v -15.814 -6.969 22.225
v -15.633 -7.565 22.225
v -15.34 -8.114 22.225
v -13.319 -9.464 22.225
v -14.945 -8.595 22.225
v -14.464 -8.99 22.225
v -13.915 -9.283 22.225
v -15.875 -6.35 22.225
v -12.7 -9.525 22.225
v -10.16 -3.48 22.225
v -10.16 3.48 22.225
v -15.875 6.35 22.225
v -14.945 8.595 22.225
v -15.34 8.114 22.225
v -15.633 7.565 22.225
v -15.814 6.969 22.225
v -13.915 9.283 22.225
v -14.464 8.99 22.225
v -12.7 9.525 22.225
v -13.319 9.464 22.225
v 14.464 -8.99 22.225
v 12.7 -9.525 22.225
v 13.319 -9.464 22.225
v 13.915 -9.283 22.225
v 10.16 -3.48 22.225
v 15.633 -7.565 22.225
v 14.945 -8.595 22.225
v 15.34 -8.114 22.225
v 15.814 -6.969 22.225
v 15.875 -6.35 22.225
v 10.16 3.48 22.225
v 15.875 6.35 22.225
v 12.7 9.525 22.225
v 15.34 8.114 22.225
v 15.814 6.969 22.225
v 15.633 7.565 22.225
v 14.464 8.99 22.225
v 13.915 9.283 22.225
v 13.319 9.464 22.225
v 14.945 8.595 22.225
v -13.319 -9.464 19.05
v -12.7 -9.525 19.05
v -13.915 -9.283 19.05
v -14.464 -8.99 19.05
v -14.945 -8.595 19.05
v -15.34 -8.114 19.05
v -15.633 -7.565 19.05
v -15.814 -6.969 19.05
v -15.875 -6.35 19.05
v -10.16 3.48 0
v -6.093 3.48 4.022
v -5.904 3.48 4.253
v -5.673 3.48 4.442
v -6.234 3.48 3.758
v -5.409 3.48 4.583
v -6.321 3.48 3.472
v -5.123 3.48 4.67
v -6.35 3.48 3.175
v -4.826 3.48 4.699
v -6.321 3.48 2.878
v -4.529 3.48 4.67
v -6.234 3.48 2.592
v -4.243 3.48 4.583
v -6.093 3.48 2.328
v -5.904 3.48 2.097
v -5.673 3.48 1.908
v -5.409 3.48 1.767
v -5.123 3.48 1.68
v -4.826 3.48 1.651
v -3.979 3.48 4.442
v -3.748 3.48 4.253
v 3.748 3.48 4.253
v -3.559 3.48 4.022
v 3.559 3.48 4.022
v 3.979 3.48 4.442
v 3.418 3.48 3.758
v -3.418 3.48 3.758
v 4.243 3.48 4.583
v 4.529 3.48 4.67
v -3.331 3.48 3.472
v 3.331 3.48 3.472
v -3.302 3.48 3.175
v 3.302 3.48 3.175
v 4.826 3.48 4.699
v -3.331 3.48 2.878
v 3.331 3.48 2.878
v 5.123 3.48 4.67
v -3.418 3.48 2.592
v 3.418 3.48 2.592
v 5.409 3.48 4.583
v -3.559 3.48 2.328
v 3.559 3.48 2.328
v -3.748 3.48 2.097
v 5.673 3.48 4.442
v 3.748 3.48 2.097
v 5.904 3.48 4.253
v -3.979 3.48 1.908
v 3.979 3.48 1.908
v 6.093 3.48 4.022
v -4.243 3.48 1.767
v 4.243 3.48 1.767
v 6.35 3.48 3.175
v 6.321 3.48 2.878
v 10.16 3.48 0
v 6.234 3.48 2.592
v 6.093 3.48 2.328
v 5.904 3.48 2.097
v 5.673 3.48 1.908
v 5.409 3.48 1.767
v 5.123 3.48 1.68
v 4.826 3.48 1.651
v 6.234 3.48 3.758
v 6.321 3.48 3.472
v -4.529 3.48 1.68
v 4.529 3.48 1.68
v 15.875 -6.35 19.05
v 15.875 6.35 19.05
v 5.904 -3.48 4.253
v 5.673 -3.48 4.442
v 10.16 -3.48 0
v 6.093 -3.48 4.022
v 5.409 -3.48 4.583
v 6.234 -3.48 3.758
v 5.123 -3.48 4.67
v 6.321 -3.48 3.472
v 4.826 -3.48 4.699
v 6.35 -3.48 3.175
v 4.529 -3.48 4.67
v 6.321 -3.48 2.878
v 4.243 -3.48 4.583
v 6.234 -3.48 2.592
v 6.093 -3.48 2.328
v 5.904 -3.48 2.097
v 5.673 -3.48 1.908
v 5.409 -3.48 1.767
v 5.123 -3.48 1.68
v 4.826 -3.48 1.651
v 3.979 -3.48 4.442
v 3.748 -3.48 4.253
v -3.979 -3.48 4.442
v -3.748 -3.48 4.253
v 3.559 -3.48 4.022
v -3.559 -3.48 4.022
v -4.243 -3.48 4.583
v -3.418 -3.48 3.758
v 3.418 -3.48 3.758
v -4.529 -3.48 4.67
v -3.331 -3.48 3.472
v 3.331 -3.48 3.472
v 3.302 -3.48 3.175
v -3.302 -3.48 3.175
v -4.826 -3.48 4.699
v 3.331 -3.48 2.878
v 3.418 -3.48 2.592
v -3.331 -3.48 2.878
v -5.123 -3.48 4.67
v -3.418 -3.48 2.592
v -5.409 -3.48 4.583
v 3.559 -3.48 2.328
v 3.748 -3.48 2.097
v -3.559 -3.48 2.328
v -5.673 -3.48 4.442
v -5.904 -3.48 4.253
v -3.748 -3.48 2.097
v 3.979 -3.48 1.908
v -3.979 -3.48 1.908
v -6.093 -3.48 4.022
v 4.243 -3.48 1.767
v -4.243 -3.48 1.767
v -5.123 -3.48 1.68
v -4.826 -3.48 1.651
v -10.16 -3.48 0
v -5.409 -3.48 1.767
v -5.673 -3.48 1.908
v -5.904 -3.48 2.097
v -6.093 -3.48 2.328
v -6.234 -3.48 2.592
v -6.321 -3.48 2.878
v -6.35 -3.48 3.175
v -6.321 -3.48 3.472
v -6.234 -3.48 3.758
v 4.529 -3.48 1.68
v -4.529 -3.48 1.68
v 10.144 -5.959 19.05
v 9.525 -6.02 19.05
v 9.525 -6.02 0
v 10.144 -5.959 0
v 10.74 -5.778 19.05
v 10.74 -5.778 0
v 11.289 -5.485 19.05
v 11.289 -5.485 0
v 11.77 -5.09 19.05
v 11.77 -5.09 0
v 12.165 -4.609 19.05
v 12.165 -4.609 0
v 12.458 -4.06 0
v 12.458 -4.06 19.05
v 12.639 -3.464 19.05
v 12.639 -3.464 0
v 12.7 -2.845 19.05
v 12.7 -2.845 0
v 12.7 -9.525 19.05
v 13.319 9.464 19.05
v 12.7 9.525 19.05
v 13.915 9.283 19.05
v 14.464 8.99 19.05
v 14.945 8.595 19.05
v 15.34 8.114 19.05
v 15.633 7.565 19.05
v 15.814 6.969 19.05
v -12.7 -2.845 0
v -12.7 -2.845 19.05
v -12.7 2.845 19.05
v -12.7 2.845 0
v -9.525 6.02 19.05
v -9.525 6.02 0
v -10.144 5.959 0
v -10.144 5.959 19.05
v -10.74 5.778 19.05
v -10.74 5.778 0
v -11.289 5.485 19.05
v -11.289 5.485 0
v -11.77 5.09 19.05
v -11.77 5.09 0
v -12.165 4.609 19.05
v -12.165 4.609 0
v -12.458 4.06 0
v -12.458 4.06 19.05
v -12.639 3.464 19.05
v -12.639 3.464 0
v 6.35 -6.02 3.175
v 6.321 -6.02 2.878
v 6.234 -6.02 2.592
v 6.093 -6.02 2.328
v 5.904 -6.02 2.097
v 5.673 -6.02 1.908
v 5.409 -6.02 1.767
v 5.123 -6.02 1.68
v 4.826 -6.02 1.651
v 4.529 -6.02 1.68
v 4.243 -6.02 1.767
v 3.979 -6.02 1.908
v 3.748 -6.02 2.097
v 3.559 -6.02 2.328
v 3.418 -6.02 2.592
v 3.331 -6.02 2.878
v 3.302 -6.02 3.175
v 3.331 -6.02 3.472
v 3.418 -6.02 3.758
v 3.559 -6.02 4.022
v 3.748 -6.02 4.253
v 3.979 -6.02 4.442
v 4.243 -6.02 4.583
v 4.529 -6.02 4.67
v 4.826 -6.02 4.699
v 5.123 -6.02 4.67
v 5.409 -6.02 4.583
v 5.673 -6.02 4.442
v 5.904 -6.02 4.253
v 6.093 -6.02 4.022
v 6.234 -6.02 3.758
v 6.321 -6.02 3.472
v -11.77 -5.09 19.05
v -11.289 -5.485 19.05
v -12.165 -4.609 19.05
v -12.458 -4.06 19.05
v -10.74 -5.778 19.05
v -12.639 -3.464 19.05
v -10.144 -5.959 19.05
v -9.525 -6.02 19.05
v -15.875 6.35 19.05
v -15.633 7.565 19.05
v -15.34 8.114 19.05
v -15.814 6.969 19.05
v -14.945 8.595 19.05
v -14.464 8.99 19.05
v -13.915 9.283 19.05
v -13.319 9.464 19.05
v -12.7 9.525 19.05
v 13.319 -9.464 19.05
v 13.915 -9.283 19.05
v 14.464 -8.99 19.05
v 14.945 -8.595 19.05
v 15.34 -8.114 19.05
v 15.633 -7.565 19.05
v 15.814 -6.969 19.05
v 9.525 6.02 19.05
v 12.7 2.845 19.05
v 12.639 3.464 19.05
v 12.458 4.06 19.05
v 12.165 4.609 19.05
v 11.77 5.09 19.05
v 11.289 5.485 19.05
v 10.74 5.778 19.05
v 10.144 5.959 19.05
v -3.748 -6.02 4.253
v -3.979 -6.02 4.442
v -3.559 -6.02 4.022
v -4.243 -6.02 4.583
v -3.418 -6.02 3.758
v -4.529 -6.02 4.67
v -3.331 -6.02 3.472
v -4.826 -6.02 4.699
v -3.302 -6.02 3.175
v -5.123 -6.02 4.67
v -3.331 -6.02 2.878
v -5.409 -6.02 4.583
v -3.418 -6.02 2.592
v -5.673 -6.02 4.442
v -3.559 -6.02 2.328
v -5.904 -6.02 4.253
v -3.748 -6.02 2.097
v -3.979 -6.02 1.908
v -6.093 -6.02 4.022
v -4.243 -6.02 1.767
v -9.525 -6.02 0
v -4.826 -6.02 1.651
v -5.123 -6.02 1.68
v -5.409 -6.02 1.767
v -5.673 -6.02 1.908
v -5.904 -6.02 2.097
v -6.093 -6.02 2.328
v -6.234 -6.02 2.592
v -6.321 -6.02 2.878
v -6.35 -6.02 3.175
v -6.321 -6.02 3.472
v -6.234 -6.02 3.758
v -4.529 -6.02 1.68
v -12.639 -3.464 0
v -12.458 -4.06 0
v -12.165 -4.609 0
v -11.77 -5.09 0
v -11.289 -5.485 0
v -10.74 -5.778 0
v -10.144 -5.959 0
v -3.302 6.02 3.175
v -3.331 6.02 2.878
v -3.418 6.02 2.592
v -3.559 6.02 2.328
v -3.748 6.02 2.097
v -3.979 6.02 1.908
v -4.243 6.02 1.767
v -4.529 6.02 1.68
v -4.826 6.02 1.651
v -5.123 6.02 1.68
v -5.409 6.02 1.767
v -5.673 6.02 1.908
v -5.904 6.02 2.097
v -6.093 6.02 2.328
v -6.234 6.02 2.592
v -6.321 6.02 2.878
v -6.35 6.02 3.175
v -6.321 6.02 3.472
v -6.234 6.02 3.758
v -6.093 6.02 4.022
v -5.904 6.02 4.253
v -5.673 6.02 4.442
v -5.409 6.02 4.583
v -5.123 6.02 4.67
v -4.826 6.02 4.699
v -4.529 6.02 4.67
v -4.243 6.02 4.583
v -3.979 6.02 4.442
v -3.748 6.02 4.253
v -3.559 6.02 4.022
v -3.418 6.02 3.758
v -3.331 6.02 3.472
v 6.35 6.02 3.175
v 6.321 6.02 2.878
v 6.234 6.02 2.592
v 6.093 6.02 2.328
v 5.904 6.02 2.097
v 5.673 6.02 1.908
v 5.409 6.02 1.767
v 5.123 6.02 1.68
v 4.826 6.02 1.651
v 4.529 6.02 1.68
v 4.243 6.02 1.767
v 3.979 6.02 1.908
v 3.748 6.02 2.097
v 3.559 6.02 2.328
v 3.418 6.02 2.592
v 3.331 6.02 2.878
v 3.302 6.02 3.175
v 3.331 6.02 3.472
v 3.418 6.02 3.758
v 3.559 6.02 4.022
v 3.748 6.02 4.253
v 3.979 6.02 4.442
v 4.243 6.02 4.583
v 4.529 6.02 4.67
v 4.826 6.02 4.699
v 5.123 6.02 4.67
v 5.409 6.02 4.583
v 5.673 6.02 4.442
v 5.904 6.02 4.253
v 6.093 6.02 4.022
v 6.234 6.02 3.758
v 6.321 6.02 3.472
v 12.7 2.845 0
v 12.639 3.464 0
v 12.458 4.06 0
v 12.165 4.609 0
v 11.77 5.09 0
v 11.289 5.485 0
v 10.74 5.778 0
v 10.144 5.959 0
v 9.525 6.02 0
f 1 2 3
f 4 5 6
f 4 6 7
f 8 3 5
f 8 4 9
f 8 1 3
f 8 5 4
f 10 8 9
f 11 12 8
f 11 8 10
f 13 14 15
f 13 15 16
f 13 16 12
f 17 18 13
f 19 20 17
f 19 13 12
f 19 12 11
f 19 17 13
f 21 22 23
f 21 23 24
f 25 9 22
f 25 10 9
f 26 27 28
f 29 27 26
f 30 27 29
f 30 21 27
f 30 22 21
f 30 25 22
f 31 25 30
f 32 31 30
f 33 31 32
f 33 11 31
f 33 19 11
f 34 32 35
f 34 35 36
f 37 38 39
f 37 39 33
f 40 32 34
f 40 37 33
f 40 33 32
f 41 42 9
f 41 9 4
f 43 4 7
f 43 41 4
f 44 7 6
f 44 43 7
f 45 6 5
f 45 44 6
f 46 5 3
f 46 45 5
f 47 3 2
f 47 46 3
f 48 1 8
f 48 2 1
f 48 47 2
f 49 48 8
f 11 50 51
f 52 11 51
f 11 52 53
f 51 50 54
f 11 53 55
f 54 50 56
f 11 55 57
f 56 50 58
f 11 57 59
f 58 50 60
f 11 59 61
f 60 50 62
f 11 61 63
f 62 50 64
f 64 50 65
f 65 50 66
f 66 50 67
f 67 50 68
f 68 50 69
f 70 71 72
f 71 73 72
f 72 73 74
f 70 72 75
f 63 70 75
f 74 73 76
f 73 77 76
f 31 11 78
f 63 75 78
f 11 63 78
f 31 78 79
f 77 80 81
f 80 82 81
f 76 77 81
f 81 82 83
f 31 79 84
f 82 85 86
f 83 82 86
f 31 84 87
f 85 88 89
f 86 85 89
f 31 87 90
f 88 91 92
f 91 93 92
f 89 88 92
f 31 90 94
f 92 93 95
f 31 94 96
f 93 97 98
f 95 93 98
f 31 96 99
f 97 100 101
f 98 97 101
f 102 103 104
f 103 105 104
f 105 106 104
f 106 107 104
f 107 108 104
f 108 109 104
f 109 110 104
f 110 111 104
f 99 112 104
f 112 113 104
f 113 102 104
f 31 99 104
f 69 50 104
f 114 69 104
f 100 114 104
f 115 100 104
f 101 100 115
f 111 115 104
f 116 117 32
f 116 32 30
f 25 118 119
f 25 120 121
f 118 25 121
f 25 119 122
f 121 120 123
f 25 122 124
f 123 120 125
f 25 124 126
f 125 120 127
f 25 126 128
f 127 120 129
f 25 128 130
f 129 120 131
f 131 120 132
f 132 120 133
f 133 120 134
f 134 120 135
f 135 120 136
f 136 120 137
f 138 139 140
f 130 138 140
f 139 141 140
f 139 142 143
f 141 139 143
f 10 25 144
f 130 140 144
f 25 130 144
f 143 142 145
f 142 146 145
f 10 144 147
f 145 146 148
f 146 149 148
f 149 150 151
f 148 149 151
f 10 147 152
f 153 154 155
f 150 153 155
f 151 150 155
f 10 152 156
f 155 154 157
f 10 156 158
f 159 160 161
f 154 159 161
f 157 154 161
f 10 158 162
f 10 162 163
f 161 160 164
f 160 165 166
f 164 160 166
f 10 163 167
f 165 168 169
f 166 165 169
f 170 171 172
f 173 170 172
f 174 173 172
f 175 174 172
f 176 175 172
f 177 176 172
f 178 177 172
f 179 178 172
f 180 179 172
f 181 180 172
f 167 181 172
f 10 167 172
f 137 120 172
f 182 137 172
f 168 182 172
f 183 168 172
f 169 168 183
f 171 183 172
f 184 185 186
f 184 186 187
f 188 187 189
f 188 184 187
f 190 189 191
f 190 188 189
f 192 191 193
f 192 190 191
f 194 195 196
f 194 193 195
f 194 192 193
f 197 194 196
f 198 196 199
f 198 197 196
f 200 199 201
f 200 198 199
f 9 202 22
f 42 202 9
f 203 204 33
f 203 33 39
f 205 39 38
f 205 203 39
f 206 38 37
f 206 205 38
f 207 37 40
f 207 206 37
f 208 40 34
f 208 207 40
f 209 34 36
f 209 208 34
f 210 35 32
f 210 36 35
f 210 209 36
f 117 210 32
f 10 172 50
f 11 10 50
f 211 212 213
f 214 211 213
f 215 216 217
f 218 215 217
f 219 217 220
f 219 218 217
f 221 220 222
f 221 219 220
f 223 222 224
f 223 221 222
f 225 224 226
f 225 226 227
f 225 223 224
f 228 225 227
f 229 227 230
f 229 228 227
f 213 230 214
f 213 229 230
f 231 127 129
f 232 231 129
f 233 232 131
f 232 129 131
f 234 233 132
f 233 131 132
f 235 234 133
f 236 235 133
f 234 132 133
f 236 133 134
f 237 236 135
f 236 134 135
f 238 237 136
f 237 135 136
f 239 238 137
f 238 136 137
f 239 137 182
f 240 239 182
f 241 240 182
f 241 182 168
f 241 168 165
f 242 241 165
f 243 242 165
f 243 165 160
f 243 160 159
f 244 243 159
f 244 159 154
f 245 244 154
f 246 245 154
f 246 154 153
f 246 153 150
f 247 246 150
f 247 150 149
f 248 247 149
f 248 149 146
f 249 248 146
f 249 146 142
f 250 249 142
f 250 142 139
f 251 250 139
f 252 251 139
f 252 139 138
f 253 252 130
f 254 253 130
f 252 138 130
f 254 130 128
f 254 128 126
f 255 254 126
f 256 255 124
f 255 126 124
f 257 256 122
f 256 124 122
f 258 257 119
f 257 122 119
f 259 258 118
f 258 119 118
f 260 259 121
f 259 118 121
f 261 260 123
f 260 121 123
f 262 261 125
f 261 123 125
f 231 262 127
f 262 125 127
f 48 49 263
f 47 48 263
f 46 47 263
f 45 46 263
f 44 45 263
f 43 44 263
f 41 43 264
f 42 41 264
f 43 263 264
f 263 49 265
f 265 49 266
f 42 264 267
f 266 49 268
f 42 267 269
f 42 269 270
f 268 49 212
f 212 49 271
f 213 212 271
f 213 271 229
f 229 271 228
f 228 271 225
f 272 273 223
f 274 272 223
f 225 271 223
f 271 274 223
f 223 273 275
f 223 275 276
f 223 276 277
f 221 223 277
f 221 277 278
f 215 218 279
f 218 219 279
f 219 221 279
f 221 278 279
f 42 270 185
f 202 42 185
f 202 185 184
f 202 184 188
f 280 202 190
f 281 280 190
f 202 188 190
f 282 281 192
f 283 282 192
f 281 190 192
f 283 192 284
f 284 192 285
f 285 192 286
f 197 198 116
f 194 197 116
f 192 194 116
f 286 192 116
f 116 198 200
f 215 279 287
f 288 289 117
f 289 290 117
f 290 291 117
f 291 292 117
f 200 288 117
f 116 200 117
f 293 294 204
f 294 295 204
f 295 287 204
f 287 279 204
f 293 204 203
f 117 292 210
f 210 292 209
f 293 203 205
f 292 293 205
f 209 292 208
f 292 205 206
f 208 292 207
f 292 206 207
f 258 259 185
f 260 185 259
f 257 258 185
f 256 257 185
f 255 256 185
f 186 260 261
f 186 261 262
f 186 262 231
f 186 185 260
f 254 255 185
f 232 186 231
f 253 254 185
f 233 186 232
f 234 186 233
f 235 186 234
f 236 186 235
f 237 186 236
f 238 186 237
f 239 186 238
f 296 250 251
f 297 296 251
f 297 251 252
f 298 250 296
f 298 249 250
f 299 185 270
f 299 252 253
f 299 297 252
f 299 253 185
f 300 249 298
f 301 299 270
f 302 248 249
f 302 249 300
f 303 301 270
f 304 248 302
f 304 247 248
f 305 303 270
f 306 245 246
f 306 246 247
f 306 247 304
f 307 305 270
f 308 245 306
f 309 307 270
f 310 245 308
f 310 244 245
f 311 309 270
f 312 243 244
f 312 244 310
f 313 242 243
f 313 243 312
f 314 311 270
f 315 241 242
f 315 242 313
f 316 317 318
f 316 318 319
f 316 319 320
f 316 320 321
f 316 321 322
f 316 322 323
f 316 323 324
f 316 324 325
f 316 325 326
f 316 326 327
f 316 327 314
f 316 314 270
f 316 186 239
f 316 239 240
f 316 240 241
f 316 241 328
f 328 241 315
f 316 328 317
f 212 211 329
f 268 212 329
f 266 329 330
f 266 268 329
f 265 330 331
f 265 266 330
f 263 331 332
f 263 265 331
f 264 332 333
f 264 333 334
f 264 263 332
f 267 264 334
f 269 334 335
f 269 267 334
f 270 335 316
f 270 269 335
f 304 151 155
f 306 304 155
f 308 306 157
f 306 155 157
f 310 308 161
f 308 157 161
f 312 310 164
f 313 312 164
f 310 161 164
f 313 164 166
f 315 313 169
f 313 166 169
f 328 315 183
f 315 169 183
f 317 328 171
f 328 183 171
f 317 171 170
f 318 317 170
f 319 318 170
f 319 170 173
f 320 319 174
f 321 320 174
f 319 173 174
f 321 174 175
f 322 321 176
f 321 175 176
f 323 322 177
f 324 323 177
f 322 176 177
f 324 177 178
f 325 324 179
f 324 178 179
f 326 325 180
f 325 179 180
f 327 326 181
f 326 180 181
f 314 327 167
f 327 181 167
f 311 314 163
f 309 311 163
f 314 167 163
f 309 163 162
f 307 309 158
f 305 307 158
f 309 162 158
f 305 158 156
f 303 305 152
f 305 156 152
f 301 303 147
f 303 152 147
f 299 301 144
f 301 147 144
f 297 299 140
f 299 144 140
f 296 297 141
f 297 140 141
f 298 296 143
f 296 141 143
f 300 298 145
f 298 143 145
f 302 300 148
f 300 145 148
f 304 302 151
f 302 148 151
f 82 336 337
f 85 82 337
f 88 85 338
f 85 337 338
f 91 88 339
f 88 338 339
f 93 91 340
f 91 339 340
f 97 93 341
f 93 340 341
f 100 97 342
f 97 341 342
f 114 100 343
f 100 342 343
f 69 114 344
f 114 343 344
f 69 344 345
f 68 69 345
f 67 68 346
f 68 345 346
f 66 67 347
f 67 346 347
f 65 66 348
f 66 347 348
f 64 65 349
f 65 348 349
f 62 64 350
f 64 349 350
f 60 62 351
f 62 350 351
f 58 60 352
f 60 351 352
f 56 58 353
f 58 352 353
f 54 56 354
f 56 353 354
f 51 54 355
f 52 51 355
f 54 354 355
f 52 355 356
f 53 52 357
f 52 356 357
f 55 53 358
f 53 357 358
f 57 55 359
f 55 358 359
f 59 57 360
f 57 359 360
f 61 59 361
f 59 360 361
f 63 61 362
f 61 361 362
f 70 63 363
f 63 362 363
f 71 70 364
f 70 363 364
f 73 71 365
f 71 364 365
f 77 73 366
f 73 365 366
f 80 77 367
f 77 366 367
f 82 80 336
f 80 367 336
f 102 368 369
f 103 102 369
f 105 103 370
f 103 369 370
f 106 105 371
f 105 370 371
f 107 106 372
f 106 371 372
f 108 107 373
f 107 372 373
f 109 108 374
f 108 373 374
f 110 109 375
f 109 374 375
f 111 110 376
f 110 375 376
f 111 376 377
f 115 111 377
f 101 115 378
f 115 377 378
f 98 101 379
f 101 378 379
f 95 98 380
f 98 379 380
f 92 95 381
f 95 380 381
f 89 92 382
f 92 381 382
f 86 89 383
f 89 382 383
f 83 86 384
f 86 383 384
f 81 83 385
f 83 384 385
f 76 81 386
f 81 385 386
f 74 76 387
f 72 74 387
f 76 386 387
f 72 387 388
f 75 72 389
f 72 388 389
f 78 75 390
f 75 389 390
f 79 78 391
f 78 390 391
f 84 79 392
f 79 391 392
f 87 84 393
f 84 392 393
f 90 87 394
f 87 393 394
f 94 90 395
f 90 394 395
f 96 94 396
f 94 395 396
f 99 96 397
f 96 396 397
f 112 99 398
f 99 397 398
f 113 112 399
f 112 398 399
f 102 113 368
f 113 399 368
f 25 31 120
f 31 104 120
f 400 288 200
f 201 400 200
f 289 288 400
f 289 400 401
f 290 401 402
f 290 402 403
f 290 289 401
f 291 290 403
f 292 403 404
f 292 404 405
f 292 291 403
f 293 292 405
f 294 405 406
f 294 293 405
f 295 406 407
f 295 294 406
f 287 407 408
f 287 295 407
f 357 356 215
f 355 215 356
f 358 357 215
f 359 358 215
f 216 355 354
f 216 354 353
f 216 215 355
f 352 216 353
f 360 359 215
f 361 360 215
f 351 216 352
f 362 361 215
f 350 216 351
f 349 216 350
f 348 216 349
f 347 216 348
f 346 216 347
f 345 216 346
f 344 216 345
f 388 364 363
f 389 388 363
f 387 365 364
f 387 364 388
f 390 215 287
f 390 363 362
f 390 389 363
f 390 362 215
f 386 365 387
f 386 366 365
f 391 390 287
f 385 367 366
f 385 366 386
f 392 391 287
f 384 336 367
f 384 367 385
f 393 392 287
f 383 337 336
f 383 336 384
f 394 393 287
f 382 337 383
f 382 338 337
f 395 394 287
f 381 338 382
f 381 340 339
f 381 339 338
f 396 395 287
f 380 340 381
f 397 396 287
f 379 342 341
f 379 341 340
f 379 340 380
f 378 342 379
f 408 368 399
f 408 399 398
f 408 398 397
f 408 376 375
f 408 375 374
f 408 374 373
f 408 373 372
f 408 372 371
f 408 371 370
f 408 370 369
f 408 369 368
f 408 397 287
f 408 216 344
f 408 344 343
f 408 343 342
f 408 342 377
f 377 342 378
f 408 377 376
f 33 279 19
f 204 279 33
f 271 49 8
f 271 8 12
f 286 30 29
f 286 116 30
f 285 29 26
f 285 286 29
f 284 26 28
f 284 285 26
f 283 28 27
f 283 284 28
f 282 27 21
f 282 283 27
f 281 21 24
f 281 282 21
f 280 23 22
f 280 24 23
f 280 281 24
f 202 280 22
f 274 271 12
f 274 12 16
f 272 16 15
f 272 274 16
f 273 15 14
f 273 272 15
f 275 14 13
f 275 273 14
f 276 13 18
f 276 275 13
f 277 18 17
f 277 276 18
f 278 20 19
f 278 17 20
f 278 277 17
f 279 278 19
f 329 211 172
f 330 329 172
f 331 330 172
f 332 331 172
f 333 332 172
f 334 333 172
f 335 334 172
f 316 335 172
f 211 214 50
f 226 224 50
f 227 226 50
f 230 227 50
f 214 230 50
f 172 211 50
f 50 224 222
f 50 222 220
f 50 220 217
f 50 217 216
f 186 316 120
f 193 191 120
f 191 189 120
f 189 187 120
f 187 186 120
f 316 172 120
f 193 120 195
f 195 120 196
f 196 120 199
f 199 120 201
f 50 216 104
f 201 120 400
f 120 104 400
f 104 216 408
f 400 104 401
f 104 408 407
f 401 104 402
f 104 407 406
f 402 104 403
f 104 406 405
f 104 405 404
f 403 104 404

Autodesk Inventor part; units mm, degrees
ref_plane "YZ Plane" through (0, 0, 0) normal (1, 0, 0) x (0, 1, 0)
ref_plane "XZ Plane" through (0, 0, 0) normal (0, 1, 0) x (-1, 0, 0)
ref_plane "XY Plane" through (0, 0, 0) normal (0, 0, 1) x (1, 0, 0)
sketch "Sketch1" plane through (0, 0, 0) normal (0, 0, 1) x (1, 0, 0)
  line L0 (12.7, -6.0198) -> (-12.7, -6.0198)
  line L1 (-12.7, -6.0198) -> (-12.7, 6.0198)
  line L2 (-12.7, 6.0198) -> (12.7, 6.0198)
  line L3 (12.7, 6.0198) -> (12.7, -6.0198)
  line L4 (12.7, -6.0198) -> (-12.7, 6.0198) construction
  line L5 (-12.7, -6.0198) -> (12.7, 6.0198) construction
  point P0 (0, 0)
  dimension "d0" = 25.4
  dimension "d1" = 12.0396
extrude "Extrusion1" add sketch "Sketch1" along normal blind 19.05
shell "Shell1" thickness 2.54 removed faces 2 at (4.2333, -2.0066, 0) at (4.2333, -2.0066, 19.05)
sketch "Sketch2" plane through (-12.7, 6.0198, 0) normal (0, 1, 0) x (1, 0, 0)
  line L0 (-2.1226, -3.175) -> (30.0619, -3.175)
  line L1 (0, 0) -> (25.4, 0) projected
  circle A0 centre (7.874, -3.175) radius 1.524
  circle A1 centre (17.526, -3.175) radius 1.524
  line L2 (12.7, 1.1779) -> (12.7, -16.2415)
  point P0 (12.7, 0)
  point P1 (12.7, 0)
  dimension "d23" = 3.175
  dimension "d24" = 3.048
  dimension "d25" = 9.652
extrude "Extrusion2" cut sketch "Sketch2" against normal through all
sketch "Sketch3" plane through (0, 0, 19.05) normal (0, 0, 1) x (1, 0, 0)
  line L0 (-10.16, 3.4798) -> (10.16, 3.4798)
  line L1 (10.16, 3.4798) -> (10.16, -3.4798)
  line L2 (10.16, -3.4798) -> (-10.16, -3.4798)
  line L3 (-10.16, -3.4798) -> (-10.16, 3.4798)
  line L4 (-10.16, 3.4798) -> (10.16, -3.4798) construction
  line L5 (10.16, 3.4798) -> (-10.16, -3.4798) construction
  line L6 (-12.7, 9.525) -> (12.7, 9.525)
  line L7 (15.875, 6.35) -> (15.875, -6.35)
  line L8 (12.7, -9.525) -> (-12.7, -9.525)
  line L9 (-15.875, -6.35) -> (-15.875, 6.35)
  line L10 (-15.875, 9.525) -> (15.875, -9.525) construction
  line L11 (15.875, 9.525) -> (-15.875, -9.525) construction
  arc A0 (12.7, -9.525) -> (15.875, -6.35) centre (12.7, -6.35) ccw
  arc A1 (15.875, 6.35) -> (12.7, 9.525) centre (12.7, 6.35) ccw
  arc A2 (-12.7, 9.525) -> (-15.875, 6.35) centre (-12.7, 6.35) ccw
  arc A3 (-15.875, -6.35) -> (-12.7, -9.525) centre (-12.7, -6.35) ccw
  point P0 (0, 0)
  dimension "d28" = 19.05
  dimension "d29" = 31.75
  dimension "d30" = 3.175
extrude "Extrusion3" add sketch "Sketch3" along normal blind 3.175
fillet "Fillet1" radius 3.175 4 edges at (12.7, 6.0198, 9.525) (12.7, -6.0198, 9.525) (-12.7, 6.0198, 9.525) (-12.7, -6.0198, 9.525)
properties part number "E-Stop_Fixture_Tall"
